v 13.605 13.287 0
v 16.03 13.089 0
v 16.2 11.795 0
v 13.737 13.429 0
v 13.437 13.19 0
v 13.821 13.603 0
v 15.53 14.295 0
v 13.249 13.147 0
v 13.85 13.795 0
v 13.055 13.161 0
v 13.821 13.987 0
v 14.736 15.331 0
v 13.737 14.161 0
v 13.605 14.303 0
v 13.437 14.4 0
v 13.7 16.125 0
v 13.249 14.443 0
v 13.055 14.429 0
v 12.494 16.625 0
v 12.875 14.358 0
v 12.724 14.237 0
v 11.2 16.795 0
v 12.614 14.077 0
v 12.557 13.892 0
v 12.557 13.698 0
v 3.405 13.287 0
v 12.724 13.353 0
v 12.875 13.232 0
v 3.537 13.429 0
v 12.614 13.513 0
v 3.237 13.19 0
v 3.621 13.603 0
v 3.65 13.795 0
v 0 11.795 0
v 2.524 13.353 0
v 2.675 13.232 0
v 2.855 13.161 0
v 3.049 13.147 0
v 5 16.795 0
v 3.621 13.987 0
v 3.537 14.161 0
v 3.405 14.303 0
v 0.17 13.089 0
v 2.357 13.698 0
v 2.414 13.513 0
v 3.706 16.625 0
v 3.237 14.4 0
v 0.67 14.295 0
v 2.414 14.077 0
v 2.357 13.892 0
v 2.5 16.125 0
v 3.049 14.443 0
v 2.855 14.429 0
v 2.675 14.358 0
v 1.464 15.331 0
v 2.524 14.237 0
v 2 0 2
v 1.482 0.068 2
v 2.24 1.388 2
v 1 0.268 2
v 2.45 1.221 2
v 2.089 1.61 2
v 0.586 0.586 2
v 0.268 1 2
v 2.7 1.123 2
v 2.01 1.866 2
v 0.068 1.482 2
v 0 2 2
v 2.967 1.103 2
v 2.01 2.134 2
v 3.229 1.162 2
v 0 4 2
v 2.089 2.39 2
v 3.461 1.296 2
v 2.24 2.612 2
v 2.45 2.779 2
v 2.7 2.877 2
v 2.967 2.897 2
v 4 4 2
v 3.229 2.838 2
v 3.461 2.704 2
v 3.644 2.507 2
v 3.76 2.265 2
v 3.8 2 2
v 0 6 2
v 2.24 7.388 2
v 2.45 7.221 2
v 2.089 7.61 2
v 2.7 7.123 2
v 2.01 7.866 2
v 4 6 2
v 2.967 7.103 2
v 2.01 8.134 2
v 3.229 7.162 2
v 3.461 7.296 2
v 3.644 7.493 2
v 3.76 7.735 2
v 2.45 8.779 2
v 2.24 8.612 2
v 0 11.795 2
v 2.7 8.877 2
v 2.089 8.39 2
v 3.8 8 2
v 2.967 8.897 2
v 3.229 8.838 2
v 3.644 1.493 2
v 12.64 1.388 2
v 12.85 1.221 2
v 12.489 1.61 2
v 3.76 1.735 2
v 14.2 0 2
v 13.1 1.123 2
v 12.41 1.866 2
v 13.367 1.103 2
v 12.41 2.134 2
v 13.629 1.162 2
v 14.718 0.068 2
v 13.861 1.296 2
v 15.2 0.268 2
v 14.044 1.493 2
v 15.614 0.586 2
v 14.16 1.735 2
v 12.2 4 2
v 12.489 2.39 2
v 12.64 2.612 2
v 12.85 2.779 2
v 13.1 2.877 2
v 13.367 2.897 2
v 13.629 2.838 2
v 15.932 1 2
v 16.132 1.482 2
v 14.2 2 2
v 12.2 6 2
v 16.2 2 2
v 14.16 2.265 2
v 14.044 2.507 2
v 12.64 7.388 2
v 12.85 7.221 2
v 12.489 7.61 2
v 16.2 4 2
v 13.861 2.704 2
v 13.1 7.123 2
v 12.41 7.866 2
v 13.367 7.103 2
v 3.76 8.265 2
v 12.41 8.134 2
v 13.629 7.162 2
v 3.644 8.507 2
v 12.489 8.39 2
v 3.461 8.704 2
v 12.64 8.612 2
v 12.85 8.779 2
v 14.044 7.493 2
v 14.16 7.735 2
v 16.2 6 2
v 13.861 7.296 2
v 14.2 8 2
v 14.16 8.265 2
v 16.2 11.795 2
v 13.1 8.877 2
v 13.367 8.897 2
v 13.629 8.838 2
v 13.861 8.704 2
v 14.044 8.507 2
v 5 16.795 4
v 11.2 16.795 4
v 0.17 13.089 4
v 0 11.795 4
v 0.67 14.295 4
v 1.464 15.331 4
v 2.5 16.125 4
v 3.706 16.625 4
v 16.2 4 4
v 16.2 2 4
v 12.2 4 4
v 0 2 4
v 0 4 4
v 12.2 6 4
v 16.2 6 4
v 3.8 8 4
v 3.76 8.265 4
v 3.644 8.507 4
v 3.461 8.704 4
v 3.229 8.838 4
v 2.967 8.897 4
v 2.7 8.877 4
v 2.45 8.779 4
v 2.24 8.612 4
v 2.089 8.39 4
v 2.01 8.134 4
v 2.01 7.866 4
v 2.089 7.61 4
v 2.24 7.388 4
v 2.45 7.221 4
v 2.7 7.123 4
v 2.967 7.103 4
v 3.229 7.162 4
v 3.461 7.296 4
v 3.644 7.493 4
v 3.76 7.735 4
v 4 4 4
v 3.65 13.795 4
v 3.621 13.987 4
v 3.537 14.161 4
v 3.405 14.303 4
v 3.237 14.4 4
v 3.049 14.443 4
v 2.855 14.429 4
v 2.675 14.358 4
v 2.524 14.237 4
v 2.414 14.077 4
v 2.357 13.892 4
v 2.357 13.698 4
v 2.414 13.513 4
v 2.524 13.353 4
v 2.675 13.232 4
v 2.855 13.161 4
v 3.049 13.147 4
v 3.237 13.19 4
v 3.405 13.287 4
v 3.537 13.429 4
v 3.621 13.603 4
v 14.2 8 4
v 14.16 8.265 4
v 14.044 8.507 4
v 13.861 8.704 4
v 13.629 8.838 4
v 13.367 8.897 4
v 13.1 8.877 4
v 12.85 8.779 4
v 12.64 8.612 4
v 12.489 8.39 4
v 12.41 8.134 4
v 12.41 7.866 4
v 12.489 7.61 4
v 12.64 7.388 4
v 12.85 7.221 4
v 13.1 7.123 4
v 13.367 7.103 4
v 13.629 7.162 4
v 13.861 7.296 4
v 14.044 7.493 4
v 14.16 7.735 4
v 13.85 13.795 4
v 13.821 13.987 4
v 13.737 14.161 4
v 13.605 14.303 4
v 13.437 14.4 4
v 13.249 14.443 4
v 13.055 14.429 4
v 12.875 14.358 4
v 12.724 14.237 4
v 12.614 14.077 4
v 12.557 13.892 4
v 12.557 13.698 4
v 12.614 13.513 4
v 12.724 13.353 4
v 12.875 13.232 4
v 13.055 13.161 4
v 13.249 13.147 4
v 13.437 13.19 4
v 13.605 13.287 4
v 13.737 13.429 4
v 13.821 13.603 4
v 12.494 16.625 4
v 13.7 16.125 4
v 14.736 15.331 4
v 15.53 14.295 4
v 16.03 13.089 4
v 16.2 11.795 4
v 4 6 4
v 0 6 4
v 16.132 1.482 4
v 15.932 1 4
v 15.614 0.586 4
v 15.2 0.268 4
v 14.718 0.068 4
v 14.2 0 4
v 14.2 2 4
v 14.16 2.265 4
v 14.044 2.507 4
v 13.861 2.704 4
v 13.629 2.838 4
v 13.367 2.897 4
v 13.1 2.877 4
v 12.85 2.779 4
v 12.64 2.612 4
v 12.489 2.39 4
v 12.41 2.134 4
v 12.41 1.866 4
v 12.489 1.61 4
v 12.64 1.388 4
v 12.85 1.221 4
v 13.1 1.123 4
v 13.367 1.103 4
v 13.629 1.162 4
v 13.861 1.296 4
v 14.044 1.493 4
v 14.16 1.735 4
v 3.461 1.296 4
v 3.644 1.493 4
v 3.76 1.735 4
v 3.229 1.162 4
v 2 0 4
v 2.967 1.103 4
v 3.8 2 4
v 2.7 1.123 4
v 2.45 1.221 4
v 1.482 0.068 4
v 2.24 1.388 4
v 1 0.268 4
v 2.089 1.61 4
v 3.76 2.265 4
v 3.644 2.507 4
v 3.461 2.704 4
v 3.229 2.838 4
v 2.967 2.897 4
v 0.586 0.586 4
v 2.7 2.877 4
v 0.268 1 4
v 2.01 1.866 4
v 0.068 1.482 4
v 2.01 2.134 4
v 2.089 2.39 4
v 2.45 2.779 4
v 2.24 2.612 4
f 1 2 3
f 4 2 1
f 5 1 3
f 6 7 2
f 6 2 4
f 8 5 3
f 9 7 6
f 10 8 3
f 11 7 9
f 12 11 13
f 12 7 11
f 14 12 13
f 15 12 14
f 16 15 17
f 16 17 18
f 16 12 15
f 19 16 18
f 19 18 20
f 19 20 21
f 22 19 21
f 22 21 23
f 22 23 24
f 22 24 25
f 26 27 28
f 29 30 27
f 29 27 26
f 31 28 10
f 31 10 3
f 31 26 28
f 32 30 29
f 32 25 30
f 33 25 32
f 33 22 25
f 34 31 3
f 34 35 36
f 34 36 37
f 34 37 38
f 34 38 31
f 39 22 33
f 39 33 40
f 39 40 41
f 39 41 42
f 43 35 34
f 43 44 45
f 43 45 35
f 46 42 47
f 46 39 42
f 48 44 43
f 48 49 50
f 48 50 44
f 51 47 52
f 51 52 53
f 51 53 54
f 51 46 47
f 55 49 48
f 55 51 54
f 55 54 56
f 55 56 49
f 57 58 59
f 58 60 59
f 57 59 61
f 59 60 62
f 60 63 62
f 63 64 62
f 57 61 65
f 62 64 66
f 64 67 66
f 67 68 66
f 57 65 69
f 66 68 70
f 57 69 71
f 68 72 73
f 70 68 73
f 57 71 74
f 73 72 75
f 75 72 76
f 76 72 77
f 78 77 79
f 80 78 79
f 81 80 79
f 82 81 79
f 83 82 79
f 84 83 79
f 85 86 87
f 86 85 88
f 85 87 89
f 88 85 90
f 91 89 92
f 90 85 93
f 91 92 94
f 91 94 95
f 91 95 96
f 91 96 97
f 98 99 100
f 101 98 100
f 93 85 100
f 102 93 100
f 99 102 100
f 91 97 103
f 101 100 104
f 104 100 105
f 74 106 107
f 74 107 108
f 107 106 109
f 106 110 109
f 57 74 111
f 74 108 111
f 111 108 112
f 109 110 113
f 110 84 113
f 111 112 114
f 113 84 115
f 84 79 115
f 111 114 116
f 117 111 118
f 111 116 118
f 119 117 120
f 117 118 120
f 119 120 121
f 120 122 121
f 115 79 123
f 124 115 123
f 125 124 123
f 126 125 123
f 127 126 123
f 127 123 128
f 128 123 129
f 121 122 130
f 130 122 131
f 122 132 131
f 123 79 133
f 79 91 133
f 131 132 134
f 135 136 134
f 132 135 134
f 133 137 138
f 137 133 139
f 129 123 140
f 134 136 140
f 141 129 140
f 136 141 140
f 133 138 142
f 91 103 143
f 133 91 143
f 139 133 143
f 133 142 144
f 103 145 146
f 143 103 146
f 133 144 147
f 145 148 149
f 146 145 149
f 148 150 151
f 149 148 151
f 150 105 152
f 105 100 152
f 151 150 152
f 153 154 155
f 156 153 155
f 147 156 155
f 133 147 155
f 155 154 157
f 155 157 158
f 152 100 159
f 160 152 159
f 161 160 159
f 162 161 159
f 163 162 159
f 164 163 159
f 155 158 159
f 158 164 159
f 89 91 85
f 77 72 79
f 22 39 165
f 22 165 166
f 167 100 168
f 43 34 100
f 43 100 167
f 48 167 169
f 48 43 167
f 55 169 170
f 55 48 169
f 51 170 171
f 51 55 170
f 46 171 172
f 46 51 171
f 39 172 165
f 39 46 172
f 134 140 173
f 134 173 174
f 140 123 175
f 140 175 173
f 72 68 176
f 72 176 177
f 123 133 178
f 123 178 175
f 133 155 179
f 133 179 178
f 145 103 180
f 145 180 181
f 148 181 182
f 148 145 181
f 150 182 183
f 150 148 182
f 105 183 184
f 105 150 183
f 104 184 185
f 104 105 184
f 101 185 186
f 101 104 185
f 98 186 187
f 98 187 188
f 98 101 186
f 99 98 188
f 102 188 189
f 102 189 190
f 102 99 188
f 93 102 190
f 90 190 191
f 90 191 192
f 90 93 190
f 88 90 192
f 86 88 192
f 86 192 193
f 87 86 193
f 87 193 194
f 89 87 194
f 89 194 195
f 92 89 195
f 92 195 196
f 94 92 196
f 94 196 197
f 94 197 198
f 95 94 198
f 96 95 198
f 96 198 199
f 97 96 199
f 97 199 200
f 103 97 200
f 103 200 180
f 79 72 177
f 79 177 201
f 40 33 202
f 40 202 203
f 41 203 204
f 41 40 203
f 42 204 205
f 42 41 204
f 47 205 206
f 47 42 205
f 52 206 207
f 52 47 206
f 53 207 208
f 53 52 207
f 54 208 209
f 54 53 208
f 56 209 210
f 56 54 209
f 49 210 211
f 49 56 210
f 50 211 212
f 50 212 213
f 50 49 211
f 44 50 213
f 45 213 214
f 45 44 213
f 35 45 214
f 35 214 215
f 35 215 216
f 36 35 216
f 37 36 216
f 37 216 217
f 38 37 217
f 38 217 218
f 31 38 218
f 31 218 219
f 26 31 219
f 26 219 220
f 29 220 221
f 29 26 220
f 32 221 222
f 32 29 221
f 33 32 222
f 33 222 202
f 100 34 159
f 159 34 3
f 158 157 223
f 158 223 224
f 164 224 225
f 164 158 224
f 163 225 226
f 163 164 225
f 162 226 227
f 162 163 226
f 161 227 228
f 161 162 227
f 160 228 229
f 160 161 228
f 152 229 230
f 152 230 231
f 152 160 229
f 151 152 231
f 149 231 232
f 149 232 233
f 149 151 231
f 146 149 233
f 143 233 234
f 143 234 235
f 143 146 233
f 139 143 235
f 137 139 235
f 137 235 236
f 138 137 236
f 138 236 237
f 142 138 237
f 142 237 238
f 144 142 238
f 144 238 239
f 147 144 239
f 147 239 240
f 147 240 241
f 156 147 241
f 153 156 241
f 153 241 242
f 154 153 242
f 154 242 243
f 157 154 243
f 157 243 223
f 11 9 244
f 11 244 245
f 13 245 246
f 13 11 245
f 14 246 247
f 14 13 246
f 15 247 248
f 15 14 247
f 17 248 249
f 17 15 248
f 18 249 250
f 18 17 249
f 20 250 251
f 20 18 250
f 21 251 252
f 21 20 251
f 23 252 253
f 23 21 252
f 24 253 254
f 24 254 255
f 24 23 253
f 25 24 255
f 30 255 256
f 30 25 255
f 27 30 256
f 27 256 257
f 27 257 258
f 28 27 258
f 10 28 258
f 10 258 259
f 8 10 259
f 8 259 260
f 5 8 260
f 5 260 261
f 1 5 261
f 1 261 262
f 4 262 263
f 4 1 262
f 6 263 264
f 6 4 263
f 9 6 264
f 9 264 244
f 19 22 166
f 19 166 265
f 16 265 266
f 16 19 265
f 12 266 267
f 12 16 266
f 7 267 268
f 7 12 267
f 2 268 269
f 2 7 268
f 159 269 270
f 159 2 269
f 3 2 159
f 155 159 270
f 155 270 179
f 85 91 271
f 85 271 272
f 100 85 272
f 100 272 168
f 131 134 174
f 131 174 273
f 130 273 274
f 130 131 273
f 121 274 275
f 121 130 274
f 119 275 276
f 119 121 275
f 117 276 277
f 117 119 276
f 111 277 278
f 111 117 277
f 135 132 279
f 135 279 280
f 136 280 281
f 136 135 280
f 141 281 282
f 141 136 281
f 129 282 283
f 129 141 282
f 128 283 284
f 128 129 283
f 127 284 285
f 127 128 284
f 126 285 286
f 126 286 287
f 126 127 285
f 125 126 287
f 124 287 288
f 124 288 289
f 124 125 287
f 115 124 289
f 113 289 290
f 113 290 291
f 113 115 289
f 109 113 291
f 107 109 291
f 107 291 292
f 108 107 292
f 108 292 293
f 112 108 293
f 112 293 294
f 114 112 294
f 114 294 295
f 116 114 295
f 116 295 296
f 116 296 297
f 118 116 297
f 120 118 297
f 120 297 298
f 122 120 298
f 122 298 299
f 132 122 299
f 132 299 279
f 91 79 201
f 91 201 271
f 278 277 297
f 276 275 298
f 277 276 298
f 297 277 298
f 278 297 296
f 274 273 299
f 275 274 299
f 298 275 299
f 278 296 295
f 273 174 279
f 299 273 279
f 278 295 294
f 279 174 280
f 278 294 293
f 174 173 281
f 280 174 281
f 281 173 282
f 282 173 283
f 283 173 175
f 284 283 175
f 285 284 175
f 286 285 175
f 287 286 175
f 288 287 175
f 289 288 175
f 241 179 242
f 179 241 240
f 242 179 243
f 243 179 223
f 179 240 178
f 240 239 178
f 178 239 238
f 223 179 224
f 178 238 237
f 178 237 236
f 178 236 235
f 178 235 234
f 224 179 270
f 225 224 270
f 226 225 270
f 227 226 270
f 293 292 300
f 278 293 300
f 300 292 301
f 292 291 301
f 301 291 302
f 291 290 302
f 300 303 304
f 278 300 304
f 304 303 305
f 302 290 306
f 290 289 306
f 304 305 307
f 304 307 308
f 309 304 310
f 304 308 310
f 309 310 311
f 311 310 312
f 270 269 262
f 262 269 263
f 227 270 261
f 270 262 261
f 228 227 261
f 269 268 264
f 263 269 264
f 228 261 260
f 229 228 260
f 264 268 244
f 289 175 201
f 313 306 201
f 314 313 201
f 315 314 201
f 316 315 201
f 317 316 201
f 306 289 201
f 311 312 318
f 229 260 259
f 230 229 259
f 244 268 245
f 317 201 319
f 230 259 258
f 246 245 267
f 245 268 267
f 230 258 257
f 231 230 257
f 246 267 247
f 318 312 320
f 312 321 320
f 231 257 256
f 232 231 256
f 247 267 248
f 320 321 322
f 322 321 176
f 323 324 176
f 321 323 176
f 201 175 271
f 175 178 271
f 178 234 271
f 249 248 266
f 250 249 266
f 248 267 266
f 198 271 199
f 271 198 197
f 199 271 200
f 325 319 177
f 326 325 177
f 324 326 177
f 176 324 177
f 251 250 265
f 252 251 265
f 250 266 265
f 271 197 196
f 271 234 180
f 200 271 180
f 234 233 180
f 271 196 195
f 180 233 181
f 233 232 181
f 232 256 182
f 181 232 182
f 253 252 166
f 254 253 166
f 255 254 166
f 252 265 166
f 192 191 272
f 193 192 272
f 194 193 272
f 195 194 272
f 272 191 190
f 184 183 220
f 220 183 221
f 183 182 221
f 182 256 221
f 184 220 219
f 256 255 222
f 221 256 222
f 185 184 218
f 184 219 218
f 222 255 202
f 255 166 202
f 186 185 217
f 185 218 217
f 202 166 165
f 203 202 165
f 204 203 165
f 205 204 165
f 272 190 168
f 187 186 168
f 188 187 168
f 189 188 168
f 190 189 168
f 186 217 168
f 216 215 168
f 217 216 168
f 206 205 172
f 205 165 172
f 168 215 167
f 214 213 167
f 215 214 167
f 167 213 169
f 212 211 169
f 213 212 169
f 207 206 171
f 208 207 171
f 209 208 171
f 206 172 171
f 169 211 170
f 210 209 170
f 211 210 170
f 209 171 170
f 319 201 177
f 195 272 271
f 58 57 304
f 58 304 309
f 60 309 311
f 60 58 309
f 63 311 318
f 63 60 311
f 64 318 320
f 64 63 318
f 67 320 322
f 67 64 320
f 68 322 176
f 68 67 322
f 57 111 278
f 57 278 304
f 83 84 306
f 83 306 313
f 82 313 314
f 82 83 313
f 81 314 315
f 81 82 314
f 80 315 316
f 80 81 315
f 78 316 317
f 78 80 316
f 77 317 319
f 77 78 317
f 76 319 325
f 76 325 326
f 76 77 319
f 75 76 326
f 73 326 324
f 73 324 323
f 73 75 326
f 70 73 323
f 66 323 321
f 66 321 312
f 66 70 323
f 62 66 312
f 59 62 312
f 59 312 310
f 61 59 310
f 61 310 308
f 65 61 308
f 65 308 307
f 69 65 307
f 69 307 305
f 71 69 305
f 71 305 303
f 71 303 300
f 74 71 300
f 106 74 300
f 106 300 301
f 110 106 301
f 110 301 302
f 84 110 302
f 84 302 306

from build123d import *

# Parameters (mm, degrees)
SKETCH1_R           = 0.9
SKETCH1_R_2         = 0.65
BOSS_EXTRUDE1_DEPTH = 4
SKETCH2_W           = 16.2
SKETCH2_H           = 11.795
CUT_EXTRUDE1_DEPTH  = 2


with BuildPart() as part:
    # Sketch1 → Boss-Extrude1 (new body)
    with BuildSketch(Plane.XY):
        with BuildLine():
            Line((0, 6), (0, 11.795))
            ThreePointArc((0, 11.795), (1.464466094, 15.330533906), (5, 16.795))
            Line((5, 16.795), (11.2, 16.795))
            ThreePointArc((11.2, 16.795), (14.735533906, 15.330533906), (16.2, 11.795))
            Line((16.2, 11.795), (16.2, 6))
            Line((16.2, 6), (12.2, 6))
            Line((12.2, 6), (12.2, 4))
            Line((12.2, 4), (16.2, 4))
            Line((16.2, 4), (16.2, 2))
            ThreePointArc((16.2, 2), (15.614213562, 0.585786438), (14.2, 0))
            Line((14.2, 0), (2, 0))
            ThreePointArc((2, 0), (0.585786438, 0.585786438), (0, 2))
            Line((0, 2), (0, 4))
            Line((0, 4), (4, 4))
            Line((4, 4), (4, 6))
            Line((4, 6), (0, 6))
        make_face()
        with Locations((13.3, 2)):
            Circle(SKETCH1_R, mode=Mode.SUBTRACT)
        with Locations((13.3, 8)):
            Circle(SKETCH1_R, mode=Mode.SUBTRACT)
        with Locations((3, 13.795)):
            Circle(SKETCH1_R_2, mode=Mode.SUBTRACT)
        with Locations((13.2, 13.795)):
            Circle(SKETCH1_R_2, mode=Mode.SUBTRACT)
        with Locations((2.9, 8)):
            Circle(SKETCH1_R, mode=Mode.SUBTRACT)
        with Locations((2.9, 2)):
            Circle(SKETCH1_R, mode=Mode.SUBTRACT)
    extrude(amount=BOSS_EXTRUDE1_DEPTH)

    # Sketch2 → Cut-Extrude1 (cut)
    with BuildSketch(Plane.XY):
        with Locations((8.1, 5.8975)):
            Rectangle(SKETCH2_W, SKETCH2_H)
    extrude(amount=CUT_EXTRUDE1_DEPTH, mode=Mode.SUBTRACT)


solid = part.part
